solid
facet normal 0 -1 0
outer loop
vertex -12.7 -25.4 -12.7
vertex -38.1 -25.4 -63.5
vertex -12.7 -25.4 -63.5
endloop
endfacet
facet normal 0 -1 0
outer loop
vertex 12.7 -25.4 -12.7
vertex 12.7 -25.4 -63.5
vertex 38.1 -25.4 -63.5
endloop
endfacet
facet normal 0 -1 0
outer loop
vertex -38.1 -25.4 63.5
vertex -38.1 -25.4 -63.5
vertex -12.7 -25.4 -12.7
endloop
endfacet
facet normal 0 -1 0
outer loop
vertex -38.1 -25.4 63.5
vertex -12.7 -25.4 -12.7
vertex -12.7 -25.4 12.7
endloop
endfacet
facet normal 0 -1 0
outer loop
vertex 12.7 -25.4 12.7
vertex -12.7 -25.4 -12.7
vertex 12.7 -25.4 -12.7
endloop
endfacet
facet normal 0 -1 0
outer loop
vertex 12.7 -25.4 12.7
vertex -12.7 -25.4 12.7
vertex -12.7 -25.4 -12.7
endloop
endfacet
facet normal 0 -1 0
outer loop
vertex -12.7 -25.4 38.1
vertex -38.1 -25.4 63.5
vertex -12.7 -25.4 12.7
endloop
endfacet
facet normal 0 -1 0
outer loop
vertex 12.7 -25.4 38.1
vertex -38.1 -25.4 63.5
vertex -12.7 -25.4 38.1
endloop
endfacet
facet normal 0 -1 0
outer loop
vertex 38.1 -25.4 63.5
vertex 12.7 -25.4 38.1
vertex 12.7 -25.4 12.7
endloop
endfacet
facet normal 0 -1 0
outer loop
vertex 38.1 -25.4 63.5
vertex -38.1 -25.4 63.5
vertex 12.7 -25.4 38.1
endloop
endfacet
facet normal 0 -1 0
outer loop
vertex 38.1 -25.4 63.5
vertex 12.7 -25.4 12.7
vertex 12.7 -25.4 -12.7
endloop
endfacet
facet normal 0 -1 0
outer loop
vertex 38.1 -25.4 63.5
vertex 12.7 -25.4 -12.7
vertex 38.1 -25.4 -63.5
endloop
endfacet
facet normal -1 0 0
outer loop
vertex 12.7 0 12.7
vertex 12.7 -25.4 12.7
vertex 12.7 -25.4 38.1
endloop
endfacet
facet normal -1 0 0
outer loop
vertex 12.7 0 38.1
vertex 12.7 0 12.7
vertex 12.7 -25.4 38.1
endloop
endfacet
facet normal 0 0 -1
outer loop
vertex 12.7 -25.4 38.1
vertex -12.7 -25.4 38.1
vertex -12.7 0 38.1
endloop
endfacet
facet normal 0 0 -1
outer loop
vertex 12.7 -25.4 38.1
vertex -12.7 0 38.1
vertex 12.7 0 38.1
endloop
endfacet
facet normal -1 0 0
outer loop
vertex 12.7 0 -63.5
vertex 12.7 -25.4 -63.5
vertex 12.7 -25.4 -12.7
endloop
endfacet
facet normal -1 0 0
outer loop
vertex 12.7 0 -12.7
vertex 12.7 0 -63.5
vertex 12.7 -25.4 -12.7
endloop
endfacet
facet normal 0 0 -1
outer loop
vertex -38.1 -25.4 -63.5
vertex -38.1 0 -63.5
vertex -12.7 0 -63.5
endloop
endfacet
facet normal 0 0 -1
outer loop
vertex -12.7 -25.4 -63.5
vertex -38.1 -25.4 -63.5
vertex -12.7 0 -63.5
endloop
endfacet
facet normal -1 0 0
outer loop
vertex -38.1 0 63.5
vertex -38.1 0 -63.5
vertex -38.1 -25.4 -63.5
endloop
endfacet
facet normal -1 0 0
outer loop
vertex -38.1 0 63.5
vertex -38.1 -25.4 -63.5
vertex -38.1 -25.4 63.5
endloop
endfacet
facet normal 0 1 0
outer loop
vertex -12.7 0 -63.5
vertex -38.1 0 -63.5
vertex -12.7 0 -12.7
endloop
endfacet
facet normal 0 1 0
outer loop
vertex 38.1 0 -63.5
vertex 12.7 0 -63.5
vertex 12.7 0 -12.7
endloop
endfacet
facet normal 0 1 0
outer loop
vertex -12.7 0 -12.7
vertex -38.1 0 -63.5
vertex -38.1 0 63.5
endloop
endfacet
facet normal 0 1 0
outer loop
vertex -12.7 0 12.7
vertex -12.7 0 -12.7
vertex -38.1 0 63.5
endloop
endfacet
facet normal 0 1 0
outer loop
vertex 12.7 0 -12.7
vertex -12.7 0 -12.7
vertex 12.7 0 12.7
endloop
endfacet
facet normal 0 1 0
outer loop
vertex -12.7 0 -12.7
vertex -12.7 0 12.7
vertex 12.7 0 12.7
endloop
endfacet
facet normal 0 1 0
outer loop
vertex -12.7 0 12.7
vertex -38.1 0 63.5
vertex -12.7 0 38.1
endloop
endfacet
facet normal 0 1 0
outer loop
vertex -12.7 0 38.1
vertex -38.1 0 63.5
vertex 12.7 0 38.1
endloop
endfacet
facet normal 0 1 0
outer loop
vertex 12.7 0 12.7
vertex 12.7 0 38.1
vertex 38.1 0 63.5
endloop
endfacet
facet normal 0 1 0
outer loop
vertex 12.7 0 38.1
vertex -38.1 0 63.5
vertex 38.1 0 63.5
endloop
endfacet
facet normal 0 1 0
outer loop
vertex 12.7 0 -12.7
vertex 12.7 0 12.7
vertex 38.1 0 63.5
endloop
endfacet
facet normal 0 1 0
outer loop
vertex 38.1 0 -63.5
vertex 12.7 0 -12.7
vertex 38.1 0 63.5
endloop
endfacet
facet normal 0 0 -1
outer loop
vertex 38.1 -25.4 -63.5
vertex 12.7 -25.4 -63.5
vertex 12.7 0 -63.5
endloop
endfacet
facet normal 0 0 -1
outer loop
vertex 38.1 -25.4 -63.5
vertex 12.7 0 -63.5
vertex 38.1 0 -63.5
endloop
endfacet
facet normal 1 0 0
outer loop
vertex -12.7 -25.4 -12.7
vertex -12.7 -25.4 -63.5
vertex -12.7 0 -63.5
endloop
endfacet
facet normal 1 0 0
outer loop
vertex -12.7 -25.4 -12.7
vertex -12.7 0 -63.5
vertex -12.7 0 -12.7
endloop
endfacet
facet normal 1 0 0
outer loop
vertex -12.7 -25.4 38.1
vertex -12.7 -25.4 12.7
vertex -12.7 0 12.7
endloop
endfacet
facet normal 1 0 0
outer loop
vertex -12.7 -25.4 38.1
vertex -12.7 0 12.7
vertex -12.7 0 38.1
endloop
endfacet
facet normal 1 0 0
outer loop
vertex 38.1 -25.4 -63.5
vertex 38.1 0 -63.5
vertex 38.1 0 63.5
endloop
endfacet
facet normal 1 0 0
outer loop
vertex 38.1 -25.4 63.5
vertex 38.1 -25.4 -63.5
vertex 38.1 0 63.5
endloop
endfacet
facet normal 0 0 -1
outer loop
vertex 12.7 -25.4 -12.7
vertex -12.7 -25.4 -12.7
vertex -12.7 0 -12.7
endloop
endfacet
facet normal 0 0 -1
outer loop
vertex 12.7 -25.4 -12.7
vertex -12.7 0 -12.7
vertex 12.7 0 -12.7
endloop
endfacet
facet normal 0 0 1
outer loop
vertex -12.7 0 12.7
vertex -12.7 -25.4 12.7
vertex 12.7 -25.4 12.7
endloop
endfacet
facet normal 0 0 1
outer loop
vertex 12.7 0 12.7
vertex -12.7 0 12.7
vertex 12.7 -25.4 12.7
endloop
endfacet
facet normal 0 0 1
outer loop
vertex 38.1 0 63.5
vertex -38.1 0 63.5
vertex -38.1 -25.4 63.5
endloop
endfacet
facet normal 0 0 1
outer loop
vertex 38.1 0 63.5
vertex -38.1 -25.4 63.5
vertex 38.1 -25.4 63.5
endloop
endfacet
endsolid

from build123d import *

# Parameters (mm, degrees)
F0_W     = 76.2
F0_H     = 127
F1_DEPTH = 25.4
F2_W     = 25.4
F2_H     = 50.8
F3_DEPTH = 25.401
F4_W     = 25.4
F4_H     = 25.4
F5_DEPTH = 25.401


with BuildPart() as f1:
    # F0 (on Front) → F1 (new body)
    with BuildSketch(Plane.XZ):
        Rectangle(F0_W, F0_H)
    extrude(amount=F1_DEPTH)

    # F2 (on face) → F3 (cut, through all)
    with BuildSketch(Plane.XZ.offset(25.4)):
        with Locations((0, -38.1)):
            Rectangle(F2_W, F2_H)
    extrude(amount=-F3_DEPTH, mode=Mode.SUBTRACT)

    # F4 (on face) → F5 (cut, through all)
    with BuildSketch(Plane.XZ.offset(25.4)):
        with Locations((0, 25.4)):
            Rectangle(F4_W, F4_H)
    extrude(amount=-F5_DEPTH, mode=Mode.SUBTRACT)


solid = f1.part
